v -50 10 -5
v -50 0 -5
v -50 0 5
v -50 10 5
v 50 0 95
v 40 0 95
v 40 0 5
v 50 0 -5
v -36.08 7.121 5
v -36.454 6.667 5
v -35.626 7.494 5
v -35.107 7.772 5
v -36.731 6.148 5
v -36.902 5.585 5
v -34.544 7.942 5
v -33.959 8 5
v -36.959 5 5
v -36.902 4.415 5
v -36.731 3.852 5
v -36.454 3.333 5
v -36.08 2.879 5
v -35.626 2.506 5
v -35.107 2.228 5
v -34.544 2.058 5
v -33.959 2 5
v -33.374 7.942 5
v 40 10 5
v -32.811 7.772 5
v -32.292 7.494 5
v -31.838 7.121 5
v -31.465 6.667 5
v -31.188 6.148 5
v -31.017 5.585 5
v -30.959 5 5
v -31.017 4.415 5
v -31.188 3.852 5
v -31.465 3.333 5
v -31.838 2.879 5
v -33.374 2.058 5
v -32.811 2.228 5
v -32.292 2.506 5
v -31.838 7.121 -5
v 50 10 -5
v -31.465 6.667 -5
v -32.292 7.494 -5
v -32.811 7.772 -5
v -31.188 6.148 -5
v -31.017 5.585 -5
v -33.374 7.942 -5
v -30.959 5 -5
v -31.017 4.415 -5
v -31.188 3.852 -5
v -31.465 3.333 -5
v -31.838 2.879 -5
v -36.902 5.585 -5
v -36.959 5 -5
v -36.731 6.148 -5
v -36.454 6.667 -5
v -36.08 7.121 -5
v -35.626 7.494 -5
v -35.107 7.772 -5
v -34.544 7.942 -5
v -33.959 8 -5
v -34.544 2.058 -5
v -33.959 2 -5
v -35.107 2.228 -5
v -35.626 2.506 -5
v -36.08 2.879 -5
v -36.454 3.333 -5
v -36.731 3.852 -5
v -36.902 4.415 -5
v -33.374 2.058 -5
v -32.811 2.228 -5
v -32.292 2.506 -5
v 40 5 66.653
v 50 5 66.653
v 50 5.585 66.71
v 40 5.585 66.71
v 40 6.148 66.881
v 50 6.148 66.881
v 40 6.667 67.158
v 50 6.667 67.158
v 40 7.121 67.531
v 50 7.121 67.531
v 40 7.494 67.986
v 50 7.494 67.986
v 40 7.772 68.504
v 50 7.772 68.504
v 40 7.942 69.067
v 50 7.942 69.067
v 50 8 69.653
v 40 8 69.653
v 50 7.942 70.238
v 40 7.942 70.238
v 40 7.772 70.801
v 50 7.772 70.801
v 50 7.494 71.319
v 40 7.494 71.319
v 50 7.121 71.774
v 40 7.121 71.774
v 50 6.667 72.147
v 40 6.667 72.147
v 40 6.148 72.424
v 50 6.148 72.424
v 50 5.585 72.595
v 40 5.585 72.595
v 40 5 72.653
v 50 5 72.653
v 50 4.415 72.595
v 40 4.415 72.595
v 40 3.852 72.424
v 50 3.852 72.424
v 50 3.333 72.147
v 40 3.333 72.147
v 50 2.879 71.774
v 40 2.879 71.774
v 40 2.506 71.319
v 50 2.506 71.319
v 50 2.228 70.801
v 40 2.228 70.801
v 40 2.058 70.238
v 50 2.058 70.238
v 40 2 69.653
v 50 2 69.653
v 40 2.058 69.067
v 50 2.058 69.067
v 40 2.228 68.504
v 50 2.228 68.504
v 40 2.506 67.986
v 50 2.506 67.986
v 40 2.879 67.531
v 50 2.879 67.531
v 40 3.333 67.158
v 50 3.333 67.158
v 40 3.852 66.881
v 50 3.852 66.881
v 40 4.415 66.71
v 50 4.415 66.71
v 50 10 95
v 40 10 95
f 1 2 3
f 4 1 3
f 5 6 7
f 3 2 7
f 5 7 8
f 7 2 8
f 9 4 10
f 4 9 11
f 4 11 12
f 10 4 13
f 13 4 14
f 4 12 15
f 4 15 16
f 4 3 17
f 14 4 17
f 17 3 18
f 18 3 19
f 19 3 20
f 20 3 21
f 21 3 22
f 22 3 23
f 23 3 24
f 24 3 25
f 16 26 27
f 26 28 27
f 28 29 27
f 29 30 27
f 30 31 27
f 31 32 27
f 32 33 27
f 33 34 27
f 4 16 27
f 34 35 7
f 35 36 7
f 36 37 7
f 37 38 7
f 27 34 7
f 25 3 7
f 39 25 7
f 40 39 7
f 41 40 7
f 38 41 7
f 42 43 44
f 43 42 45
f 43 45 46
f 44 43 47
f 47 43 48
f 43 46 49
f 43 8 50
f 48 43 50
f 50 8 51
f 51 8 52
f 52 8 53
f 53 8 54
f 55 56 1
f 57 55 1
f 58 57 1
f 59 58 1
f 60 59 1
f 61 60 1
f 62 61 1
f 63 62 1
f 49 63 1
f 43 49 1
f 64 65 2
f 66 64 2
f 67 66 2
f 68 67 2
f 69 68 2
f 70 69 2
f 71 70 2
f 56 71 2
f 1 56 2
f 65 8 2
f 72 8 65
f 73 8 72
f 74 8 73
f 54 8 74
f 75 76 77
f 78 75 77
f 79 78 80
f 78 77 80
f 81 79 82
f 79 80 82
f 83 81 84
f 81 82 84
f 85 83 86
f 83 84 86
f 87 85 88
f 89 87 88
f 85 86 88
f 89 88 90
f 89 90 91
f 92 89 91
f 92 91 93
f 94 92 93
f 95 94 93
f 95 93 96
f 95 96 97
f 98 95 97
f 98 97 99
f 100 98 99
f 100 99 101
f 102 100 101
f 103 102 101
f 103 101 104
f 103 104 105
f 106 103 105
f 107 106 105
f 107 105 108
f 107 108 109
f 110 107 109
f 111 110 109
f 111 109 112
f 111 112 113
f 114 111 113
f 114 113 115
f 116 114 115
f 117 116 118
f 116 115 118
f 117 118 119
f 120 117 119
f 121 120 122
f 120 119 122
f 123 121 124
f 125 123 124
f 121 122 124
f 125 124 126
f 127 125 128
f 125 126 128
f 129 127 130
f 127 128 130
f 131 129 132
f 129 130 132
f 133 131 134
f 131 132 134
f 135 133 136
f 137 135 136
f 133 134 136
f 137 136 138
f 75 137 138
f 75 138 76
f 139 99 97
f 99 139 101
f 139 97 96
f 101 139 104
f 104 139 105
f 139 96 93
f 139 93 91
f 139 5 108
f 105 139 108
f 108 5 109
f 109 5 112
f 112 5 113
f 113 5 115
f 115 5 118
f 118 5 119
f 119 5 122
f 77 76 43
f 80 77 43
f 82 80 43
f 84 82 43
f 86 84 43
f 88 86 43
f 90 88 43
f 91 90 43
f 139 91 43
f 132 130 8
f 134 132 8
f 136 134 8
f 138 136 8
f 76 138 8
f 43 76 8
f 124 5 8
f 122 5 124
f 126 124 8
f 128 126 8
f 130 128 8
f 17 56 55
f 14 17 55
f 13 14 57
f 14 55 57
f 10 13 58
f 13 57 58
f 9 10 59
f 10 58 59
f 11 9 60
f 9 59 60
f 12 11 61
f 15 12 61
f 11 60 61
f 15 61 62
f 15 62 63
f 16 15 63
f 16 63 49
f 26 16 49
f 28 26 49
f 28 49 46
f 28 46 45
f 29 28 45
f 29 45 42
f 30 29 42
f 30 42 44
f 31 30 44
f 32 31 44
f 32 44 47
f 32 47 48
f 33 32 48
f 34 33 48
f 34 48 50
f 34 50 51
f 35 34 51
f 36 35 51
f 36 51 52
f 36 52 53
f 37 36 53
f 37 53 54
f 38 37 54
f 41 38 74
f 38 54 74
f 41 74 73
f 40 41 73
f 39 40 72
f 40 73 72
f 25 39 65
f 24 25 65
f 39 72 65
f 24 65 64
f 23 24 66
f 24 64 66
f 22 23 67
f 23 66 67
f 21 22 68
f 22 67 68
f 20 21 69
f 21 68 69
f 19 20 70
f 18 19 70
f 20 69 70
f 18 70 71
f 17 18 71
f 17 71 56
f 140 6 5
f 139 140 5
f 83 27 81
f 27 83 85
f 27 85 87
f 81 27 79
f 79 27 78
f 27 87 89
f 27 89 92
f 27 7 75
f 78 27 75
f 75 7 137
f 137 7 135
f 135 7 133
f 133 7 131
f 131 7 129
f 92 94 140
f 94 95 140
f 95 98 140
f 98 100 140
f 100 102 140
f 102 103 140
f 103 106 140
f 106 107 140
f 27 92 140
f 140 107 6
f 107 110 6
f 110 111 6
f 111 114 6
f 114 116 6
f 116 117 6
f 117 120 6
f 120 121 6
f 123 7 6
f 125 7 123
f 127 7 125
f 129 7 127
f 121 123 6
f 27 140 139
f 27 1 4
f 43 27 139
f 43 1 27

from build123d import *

# Parameters (mm, degrees)
Y_KSEKLIK_EKSTR_ZYON1_DEPTH = 10
IZIM2_R                     = 3
KES_EKSTR_ZYON1_DEPTH       = 113.249721603
IZIM3_R                     = 3
KES_EKSTR_ZYON2_DEPTH       = 139.293166859


with BuildPart() as part:
    # Çizim1 → Yükseklik-Ekstrüzyon1 (new body)
    with BuildSketch(Plane(origin=(0, 0, 0), x_dir=(1, 0, 0), z_dir=(0, 1, 0))):
        Polygon((-50, -5), (40, -5), (40, -95), (50, -95), (50, -10), (50, 5), (18.191830665, 5), (-50, 5), align=None)
    extrude(amount=Y_KSEKLIK_EKSTR_ZYON1_DEPTH)

    # Çizim2 → Kes-Ekstrüzyon1 (cut, through all)
    with BuildSketch(Plane(origin=(0, 0, -5), x_dir=(-1, 0, 0), z_dir=(0, 0, -1))):
        with Locations((33.959177931, 5)):
            Circle(IZIM2_R)
    extrude(amount=-KES_EKSTR_ZYON1_DEPTH, mode=Mode.SUBTRACT)

    # Çizim3 → Kes-Ekstrüzyon2 (cut, through all)
    with BuildSketch(Plane(origin=(50, 0, 0), x_dir=(0, 0, -1), z_dir=(1, 0, 0))):
        with Locations((-69.652523483, 5)):
            Circle(IZIM3_R)
    extrude(amount=-KES_EKSTR_ZYON2_DEPTH, mode=Mode.SUBTRACT)


solid = part.part
